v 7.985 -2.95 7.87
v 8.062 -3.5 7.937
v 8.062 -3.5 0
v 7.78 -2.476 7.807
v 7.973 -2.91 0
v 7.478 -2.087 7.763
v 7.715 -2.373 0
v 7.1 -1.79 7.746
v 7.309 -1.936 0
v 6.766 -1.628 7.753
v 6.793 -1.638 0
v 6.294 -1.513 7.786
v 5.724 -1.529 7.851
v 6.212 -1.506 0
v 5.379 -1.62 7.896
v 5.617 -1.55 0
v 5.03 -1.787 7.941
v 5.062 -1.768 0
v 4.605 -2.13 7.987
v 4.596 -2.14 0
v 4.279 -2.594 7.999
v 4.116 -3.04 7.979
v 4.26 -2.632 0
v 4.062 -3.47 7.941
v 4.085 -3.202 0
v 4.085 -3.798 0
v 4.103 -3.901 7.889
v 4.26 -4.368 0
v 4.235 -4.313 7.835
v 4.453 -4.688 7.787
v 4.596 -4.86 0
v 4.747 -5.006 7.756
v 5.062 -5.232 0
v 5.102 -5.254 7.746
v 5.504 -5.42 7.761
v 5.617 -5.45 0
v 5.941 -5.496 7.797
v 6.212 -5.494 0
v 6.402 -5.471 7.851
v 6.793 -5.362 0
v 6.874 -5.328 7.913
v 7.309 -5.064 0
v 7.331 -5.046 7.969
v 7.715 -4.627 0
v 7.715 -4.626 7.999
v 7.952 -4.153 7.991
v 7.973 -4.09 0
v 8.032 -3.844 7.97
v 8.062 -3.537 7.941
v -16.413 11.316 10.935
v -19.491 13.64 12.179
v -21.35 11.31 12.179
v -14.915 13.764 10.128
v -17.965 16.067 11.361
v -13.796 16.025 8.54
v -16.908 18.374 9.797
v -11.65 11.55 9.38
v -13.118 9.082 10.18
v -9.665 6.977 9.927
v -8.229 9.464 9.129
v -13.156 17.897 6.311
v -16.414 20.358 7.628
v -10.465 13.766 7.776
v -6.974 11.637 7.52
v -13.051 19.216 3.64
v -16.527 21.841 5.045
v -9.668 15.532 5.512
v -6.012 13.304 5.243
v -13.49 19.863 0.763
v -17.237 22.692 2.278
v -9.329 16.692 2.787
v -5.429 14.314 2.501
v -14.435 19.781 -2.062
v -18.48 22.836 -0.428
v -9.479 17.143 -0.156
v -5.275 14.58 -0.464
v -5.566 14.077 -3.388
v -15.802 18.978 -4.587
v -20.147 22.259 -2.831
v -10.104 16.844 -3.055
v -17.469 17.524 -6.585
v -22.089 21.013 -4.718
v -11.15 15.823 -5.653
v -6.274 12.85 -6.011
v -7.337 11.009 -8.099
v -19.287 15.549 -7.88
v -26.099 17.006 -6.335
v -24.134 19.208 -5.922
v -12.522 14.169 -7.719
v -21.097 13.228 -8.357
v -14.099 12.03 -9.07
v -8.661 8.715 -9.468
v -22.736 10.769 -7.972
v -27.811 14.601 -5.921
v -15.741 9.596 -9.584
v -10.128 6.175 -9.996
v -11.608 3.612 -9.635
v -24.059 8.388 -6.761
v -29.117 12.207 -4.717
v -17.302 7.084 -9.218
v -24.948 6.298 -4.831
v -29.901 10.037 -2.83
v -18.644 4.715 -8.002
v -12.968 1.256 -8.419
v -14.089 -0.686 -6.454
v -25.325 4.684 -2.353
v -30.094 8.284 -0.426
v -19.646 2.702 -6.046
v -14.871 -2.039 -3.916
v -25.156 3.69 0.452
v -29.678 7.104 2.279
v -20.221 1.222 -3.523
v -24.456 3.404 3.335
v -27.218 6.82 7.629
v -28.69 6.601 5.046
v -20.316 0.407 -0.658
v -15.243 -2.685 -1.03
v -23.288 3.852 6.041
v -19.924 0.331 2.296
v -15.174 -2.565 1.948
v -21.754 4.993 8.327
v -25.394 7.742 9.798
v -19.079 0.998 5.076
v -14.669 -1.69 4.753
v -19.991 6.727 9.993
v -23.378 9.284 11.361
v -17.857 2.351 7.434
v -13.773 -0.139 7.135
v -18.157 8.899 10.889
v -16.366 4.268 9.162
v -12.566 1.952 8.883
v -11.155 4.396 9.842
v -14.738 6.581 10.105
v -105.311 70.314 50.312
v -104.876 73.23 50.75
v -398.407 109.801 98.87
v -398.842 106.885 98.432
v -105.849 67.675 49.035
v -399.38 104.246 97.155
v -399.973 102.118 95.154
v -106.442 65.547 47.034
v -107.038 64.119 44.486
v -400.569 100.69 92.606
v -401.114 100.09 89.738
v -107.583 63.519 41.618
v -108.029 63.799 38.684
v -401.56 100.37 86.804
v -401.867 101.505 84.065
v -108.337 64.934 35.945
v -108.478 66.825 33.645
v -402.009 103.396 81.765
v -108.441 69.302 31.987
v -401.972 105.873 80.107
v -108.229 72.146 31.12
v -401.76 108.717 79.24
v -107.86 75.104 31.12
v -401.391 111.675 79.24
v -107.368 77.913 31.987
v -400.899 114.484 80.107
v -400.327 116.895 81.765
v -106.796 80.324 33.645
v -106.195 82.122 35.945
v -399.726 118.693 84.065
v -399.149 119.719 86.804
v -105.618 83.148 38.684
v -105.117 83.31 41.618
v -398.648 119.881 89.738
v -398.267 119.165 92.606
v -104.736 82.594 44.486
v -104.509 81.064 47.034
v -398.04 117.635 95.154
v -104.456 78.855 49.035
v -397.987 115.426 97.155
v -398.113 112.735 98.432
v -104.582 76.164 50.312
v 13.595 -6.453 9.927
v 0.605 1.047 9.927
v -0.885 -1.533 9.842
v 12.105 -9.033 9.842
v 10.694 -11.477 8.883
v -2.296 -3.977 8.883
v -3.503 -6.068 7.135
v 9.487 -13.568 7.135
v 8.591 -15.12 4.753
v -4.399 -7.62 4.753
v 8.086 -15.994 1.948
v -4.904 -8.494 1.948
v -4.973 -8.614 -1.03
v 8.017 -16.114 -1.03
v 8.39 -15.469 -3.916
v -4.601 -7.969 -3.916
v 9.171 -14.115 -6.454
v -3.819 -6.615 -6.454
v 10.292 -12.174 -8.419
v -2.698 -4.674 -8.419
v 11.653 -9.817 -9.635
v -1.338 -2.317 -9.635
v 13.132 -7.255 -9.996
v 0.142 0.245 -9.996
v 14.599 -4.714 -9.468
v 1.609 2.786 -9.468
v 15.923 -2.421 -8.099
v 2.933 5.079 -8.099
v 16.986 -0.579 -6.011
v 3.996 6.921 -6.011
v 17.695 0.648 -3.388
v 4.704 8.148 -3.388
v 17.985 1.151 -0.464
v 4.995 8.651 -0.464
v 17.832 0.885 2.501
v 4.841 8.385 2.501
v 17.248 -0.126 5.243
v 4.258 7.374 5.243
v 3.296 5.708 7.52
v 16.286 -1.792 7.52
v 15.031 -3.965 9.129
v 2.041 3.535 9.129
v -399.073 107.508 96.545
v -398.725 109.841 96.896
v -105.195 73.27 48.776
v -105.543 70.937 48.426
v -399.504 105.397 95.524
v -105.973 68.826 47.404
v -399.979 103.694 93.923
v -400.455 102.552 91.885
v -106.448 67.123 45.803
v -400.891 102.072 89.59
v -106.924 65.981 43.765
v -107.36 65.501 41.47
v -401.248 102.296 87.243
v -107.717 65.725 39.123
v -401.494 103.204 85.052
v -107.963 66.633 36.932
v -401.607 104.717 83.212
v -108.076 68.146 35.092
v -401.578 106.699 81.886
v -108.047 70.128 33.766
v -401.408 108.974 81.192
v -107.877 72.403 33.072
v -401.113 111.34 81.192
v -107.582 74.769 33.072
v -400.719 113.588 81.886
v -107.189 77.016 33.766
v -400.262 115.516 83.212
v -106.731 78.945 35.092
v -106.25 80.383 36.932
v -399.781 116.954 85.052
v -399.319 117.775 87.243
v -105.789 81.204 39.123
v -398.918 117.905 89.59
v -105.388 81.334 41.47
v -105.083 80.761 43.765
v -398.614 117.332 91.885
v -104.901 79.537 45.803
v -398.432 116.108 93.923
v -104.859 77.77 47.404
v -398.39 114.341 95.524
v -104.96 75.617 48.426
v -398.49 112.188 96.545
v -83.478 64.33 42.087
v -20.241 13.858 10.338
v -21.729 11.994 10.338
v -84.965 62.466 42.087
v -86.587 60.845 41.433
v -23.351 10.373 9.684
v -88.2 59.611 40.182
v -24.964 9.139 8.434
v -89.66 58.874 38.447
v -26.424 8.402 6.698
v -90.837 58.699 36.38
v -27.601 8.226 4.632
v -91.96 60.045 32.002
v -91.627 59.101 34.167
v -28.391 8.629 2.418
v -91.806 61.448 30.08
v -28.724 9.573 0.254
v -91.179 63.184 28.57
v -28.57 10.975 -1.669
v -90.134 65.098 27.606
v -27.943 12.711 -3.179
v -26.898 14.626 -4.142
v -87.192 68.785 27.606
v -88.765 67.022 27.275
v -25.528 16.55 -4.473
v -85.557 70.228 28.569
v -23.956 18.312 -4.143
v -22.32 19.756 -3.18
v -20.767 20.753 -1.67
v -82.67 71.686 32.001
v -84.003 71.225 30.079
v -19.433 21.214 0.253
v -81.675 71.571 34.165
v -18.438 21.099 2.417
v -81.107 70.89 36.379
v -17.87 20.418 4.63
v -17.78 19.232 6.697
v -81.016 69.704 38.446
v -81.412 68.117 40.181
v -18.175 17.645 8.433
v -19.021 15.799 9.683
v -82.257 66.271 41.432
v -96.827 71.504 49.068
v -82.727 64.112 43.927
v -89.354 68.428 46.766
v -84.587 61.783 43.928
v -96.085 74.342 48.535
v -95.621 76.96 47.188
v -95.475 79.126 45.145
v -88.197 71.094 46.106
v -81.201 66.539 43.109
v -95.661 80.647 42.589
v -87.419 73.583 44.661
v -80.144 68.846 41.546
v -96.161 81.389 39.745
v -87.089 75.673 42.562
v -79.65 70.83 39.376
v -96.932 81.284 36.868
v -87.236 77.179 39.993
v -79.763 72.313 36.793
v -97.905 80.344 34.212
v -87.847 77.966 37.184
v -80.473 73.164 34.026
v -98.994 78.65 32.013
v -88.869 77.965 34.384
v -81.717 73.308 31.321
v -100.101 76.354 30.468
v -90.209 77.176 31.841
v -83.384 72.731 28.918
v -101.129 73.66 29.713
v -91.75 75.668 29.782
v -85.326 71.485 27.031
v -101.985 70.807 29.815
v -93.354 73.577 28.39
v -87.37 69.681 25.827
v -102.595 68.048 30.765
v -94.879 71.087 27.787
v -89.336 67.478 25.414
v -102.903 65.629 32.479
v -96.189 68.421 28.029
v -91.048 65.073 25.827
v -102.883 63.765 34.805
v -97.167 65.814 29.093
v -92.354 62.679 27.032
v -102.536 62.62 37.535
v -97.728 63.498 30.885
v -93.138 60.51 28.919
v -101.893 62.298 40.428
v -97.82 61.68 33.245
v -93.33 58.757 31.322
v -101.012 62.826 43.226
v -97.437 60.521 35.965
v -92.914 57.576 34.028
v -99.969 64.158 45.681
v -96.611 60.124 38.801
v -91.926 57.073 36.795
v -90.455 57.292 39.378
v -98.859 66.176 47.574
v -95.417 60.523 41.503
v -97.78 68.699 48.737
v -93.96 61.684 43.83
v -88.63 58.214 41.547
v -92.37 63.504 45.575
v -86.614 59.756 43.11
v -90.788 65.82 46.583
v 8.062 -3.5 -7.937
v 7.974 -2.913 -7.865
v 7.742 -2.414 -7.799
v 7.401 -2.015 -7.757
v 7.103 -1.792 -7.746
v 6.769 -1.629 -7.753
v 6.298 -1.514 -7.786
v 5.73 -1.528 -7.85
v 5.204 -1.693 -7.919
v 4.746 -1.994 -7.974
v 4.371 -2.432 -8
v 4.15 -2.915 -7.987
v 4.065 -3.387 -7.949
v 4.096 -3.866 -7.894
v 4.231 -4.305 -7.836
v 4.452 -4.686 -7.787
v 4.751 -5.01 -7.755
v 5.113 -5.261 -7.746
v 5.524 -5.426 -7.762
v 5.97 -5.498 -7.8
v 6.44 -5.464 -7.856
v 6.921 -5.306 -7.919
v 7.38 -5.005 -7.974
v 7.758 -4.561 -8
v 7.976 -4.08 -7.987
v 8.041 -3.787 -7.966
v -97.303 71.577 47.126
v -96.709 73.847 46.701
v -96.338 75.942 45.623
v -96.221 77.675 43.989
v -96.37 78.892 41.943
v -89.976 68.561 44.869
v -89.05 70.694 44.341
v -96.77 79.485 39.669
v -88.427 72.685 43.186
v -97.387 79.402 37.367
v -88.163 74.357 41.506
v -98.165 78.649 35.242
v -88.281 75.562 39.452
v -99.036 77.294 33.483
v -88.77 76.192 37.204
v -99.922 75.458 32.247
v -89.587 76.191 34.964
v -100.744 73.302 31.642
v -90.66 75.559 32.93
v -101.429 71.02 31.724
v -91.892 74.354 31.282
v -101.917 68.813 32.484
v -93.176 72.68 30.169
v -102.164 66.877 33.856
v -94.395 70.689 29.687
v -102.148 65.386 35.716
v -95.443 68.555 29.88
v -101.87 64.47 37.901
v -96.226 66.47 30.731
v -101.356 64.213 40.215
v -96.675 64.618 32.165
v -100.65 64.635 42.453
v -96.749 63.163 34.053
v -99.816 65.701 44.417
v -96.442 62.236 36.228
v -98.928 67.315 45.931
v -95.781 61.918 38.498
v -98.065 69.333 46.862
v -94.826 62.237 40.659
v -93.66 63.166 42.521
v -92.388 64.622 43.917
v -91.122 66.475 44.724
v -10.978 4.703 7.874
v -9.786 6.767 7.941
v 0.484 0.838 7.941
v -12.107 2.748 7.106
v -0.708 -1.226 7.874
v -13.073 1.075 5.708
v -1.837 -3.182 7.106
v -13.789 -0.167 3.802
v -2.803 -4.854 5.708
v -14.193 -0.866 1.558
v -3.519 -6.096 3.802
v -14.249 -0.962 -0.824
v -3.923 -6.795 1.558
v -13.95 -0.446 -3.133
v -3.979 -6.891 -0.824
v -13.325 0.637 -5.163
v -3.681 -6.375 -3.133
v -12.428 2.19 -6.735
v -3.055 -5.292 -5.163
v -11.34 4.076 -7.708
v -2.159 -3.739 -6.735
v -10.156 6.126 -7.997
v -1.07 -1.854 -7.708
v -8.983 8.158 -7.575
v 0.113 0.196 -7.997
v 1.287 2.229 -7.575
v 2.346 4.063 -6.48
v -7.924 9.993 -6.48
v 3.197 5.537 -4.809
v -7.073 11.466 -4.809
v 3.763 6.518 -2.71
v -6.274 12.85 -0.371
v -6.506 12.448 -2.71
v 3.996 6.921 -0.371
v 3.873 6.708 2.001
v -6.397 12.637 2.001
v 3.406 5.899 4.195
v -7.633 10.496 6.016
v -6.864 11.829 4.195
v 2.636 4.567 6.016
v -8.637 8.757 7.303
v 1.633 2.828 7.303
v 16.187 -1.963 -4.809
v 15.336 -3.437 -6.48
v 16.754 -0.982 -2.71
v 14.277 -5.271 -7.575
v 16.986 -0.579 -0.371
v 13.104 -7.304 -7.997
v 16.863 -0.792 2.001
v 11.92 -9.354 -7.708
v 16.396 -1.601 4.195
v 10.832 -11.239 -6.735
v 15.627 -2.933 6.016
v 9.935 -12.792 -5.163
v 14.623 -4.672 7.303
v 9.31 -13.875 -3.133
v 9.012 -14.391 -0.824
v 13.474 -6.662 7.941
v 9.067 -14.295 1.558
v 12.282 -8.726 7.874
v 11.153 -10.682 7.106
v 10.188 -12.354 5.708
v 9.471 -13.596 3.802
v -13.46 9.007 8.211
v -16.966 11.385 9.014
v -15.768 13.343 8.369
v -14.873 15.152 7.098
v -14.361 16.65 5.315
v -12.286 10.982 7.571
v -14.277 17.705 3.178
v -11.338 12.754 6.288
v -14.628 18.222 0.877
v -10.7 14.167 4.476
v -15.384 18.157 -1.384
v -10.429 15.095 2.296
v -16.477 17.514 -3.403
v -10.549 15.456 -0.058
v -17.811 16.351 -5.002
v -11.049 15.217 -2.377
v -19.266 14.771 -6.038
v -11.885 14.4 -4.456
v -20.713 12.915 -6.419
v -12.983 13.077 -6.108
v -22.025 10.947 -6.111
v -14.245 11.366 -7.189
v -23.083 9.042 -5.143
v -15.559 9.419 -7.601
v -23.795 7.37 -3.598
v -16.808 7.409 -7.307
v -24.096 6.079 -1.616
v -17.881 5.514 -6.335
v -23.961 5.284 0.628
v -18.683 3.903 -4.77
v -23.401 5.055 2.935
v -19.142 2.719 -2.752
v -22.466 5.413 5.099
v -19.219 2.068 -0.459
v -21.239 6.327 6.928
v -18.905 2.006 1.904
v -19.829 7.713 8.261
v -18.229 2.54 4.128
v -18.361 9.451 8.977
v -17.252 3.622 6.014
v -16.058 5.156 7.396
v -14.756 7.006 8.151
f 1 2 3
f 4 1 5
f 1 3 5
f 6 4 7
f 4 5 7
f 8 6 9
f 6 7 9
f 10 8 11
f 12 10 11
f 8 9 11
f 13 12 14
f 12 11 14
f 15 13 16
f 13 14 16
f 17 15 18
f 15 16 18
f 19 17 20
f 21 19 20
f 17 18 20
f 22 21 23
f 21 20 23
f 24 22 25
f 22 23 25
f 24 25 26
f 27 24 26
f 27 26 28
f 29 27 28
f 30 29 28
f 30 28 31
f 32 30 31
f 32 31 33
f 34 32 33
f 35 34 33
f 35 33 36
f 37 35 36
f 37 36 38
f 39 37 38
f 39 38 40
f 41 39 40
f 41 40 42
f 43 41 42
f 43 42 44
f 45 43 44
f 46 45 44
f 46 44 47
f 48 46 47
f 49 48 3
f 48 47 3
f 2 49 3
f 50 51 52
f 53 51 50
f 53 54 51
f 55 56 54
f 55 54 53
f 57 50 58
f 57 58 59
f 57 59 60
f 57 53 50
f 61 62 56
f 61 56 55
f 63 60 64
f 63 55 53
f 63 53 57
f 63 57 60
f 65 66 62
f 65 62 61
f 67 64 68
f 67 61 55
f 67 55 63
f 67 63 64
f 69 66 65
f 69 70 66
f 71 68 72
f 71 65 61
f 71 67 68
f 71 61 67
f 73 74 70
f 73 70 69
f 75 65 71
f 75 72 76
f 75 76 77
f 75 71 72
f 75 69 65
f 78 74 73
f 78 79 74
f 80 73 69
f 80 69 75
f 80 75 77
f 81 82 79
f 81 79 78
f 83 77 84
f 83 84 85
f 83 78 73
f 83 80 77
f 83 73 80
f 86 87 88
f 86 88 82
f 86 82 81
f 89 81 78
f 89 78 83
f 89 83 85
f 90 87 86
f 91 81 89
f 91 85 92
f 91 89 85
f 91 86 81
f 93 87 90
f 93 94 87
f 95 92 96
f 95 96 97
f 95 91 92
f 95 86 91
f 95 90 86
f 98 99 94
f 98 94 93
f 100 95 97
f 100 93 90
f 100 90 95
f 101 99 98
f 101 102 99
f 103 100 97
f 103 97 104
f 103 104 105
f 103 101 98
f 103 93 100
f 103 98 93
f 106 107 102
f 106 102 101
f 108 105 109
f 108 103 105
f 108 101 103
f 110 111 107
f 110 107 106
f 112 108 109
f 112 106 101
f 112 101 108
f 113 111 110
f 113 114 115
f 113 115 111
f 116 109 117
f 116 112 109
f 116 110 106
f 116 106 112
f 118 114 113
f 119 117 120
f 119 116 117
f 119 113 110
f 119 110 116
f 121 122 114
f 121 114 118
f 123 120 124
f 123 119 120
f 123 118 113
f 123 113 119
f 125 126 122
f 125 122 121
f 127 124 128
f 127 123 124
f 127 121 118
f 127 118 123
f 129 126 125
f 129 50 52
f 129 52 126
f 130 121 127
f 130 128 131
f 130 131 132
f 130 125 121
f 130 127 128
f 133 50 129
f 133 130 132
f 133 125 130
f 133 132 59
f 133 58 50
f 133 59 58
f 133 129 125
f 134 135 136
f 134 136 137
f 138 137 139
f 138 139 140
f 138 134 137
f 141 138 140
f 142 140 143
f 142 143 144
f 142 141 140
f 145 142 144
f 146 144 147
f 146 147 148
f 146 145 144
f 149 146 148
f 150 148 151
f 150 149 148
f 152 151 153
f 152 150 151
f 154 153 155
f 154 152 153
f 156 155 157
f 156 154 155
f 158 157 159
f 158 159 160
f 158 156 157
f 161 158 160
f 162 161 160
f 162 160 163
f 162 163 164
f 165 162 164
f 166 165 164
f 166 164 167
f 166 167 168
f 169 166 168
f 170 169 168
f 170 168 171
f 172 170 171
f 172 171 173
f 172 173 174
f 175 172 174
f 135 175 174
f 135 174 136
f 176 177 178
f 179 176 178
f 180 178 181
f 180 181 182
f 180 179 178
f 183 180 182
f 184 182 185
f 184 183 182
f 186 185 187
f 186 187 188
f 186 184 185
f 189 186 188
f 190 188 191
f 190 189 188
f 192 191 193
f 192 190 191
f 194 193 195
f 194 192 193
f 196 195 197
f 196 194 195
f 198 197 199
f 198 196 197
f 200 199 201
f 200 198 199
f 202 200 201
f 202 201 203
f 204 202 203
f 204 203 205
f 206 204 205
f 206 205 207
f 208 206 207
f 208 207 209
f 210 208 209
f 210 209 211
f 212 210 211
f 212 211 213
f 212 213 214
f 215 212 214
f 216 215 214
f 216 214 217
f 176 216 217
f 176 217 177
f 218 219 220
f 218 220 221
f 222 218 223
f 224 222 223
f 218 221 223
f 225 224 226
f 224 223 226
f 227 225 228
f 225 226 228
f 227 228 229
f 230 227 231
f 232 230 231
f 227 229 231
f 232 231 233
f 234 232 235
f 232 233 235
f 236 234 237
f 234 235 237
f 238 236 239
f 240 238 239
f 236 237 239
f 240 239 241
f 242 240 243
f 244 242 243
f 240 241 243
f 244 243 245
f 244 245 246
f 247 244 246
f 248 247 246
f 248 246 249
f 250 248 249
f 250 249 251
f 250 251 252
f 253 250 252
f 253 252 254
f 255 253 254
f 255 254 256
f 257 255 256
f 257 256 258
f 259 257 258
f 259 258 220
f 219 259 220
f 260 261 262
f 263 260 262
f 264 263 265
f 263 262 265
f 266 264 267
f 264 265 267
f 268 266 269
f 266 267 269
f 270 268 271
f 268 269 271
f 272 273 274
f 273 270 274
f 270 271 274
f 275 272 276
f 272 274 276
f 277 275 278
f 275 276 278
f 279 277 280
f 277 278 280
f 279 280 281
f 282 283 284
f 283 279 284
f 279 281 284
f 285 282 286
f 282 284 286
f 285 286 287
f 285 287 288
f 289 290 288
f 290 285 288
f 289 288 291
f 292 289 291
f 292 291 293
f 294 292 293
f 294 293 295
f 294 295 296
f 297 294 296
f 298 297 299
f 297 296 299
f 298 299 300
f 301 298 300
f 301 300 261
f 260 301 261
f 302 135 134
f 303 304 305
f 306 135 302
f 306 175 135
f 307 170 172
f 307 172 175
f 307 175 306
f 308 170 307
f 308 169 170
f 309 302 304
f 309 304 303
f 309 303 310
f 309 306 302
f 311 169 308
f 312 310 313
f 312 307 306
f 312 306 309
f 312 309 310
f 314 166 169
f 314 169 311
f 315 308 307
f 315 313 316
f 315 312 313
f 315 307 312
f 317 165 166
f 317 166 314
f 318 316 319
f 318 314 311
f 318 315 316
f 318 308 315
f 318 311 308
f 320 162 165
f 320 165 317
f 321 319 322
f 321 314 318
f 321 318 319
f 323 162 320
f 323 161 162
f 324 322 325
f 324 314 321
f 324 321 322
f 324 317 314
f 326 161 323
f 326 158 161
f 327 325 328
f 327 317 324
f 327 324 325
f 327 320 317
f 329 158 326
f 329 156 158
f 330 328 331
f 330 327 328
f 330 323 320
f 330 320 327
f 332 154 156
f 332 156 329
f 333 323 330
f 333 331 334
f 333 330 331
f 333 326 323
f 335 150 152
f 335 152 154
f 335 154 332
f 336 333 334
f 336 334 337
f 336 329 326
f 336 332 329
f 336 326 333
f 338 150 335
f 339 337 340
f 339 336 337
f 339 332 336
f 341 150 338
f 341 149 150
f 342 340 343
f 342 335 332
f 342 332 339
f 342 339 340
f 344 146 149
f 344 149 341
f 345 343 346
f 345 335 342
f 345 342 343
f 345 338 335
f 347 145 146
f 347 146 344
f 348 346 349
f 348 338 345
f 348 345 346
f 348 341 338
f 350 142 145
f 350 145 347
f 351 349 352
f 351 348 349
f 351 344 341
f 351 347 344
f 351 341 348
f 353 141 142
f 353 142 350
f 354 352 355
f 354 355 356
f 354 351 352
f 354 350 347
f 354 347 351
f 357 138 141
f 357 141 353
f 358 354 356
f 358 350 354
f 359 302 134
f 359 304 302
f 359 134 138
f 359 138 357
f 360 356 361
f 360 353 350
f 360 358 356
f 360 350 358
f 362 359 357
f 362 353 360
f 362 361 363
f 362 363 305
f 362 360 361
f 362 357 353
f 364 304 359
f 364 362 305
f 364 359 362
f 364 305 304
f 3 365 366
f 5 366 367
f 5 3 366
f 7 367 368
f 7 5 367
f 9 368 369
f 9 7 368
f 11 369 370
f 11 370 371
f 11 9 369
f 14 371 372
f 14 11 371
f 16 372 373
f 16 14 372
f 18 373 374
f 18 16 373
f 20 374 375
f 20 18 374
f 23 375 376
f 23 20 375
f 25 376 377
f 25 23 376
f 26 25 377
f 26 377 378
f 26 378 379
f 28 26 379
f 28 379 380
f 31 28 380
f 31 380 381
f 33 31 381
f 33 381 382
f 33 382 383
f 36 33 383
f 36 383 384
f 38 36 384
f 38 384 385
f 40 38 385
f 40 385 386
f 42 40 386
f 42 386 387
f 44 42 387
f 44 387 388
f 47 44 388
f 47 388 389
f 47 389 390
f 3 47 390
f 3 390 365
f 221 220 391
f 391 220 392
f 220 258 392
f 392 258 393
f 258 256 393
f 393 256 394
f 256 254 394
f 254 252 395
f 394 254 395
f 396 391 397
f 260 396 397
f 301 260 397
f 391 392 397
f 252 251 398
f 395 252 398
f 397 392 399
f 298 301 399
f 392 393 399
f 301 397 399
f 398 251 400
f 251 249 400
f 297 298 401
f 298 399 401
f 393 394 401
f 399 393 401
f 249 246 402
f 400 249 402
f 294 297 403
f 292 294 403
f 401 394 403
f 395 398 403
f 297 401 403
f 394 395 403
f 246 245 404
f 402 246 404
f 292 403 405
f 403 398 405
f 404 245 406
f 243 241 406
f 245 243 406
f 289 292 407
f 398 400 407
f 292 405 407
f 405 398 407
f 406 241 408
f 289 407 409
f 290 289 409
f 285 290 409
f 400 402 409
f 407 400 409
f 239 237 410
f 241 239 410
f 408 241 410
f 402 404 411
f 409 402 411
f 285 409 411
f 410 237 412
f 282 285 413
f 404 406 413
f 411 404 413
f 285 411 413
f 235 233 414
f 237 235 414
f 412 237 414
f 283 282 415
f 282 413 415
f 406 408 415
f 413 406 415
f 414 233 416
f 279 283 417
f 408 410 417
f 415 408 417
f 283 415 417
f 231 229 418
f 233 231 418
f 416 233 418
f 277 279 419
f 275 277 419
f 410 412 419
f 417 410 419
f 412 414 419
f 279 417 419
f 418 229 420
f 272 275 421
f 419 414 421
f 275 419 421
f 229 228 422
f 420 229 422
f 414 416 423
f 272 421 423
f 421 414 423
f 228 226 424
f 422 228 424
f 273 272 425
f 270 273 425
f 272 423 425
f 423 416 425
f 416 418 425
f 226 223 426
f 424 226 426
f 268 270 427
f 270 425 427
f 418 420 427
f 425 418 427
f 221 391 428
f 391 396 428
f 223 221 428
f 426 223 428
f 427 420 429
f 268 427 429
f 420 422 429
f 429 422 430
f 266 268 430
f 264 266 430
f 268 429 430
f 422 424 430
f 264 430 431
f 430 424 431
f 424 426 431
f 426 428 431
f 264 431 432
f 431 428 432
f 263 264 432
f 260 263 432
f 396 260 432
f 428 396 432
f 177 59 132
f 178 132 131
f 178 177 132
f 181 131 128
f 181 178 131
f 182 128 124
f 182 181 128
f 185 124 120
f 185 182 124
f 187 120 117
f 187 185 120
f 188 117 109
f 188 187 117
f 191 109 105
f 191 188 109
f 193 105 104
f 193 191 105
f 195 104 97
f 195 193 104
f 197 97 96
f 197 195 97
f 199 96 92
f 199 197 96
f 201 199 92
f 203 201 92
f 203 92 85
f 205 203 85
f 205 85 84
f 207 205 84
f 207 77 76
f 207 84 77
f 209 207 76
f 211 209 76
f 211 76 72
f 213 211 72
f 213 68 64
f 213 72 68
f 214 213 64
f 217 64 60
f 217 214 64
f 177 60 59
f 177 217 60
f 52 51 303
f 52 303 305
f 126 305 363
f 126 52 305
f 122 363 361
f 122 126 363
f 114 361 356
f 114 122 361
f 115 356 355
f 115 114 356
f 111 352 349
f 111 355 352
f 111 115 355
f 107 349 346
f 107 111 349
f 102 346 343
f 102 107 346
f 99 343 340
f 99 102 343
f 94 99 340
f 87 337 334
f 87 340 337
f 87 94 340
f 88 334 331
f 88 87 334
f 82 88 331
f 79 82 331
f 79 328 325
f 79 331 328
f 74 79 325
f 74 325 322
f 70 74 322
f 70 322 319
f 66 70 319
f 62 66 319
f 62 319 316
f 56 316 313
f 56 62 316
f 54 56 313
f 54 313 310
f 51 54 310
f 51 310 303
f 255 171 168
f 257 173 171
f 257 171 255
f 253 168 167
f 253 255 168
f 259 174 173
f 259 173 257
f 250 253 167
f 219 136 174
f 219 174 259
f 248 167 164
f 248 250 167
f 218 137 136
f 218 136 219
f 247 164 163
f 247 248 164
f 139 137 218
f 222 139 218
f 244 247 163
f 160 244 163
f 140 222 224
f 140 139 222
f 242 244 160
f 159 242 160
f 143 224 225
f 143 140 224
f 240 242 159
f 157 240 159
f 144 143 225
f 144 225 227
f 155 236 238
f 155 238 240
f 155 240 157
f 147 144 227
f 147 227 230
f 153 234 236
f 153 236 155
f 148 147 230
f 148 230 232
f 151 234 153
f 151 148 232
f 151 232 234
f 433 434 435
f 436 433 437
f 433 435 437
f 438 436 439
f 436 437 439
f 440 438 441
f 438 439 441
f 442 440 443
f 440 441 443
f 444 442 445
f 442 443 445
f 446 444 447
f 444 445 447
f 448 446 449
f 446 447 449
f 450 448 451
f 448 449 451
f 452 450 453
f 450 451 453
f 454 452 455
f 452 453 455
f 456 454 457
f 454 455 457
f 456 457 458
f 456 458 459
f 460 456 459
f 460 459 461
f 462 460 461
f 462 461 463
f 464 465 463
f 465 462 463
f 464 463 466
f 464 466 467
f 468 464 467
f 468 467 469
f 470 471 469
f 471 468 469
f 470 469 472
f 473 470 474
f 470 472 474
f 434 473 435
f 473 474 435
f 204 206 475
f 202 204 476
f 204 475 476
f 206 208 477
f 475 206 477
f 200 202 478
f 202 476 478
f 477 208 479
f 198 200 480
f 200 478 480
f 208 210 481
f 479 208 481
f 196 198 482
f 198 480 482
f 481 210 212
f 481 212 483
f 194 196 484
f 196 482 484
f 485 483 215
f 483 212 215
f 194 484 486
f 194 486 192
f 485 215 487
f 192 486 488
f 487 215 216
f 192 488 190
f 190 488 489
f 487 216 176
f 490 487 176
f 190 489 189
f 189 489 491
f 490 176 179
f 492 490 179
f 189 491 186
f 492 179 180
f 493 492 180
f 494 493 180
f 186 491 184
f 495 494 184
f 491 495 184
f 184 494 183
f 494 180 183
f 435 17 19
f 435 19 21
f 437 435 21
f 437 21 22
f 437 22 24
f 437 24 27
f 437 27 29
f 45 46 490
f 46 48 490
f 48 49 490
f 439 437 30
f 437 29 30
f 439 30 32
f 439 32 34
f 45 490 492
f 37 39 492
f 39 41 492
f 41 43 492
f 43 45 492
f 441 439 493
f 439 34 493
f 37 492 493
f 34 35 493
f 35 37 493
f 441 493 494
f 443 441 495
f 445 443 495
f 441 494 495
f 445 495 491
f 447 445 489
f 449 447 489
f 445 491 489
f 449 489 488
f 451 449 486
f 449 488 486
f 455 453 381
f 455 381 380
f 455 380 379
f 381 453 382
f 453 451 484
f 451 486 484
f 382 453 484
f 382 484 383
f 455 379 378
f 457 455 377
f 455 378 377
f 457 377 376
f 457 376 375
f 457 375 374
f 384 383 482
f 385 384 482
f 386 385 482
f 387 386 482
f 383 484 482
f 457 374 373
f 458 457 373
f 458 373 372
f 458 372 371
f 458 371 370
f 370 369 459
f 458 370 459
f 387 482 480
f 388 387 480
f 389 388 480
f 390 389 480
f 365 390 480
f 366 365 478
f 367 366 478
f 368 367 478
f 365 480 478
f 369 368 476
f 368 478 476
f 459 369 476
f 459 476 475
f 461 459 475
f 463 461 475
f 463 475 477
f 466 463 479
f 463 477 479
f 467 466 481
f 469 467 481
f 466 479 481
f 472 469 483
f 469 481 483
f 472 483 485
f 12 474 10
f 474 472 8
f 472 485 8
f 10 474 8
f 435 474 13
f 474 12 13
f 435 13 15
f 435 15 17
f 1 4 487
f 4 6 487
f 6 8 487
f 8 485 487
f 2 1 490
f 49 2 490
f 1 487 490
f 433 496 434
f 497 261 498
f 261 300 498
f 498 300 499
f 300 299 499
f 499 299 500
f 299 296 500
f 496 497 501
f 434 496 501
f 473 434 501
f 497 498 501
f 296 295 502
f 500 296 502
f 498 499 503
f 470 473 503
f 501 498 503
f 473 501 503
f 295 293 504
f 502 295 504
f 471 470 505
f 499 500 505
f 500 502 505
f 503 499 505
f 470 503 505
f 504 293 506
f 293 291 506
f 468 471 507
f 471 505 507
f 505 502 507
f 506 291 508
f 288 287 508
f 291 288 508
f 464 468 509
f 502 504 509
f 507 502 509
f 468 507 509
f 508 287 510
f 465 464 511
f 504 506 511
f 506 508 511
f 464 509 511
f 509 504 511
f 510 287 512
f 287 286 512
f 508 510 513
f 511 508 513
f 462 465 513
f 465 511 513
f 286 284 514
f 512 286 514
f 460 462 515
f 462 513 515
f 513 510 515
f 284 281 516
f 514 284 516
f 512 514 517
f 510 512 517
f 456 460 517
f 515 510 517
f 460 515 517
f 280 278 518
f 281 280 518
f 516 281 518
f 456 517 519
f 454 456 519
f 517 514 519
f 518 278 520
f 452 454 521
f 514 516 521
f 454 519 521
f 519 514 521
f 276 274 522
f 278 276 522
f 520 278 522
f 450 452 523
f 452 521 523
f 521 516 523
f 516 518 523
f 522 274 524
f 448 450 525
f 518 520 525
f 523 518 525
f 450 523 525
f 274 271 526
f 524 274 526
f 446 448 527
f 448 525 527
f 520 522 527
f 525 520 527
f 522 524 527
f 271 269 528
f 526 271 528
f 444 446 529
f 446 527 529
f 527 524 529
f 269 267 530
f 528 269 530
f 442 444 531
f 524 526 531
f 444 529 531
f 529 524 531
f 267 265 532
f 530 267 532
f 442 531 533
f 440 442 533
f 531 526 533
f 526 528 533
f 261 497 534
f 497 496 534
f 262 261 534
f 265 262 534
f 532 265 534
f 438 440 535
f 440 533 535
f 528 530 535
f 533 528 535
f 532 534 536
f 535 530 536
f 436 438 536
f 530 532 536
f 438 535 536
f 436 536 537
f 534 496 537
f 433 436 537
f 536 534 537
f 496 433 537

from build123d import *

# Parameters (mm, degrees)
ESQUISSE1_R                       = 10
ESQUISSE1_R_2                     = 8
EXTRUSION1_REACH                  = 433.016
EXTRUSION1_END_RADIUS             = 8
ESQUISSE3_R                       = 2
EXTRUSION1_DIRECTION_2_REACH      = 433.016
EXTRUSION1_DIRECTION_2_END_RADIUS = 8


with BuildPart() as part:
    # Balayage1: sweep along a curve in space
    with BuildLine() as balayage1_path:
        Line((0, 0, 0), (12.990381057, -7.5, 0))
        Line((0, 0, 0), (-10.26979763, 5.929270426, 0))
        ThreePointArc((-23.243938294, 14.727794485, 2.973935241), (-17.035828208, 10.165933144, 0.751028422), (-10.26979763, 5.929270426, 0))
        Line((-23.243938294, 14.727794485, 2.973935241), (-86.480363257, 65.200039483, 34.722605481))
        ThreePointArc((-106.469208033, 73.428950509, 40.880198038), (-95.752548684, 70.629649492, 38.3883833), (-86.480363257, 65.200039483, 34.722605481))
        Line((-106.469208033, 73.428950509, 40.880198038), (-400, 110, 89))
    # Esquisse1 → Balayage1 (sweep)
    with BuildSketch(Plane(origin=(-400, 110, 89), x_dir=(0.15933409799773637, -0.019851461389881916, 0.9870251084425026), z_dir=(-0.9794525040369775, 0.12203014804395138, 0.1605659842683569))):
        Circle(ESQUISSE1_R)
        Circle(ESQUISSE1_R_2, mode=Mode.SUBTRACT)
    sweep(path=balayage1_path.line)

    # Extrusion1: up to this cylinder (the profile starts inside it)
    extrusion1_end = Plane(origin=(6.062177957, -3.500000075, 0), z_dir=(0.866025403784438, -0.500000000000001, 0)) * Cylinder(EXTRUSION1_END_RADIUS, 883.032, mode=Mode.PRIVATE)
    # Esquisse3 → Extrusion1 (add, up to the surface)
    with BuildSketch(Plane.XY, mode=Mode.PRIVATE) as extrusion1_sk1:
        with Locations((6.062177826, -3.5)):
            Circle(ESQUISSE3_R)
    extrusion1_tool1 = extrude(extrusion1_sk1.sketch, amount=EXTRUSION1_REACH, mode=Mode.PRIVATE) & extrusion1_end
    add(extrusion1_tool1.solids().sort_by_distance((6.062178, -3.5, 0))[0])

    # Extrusion1 direction 2: up to this cylinder (the profile starts inside it)
    extrusion1_direction_2_end = Plane(origin=(6.062177957, -3.500000075, 0), z_dir=(0.866025403784438, -0.500000000000001, 0)) * Cylinder(EXTRUSION1_DIRECTION_2_END_RADIUS, 883.032, mode=Mode.PRIVATE)
    # Esquisse3 → Extrusion1 direction 2 (add, up to the surface)
    with BuildSketch(Plane.XY, mode=Mode.PRIVATE) as extrusion1_direction_2_sk1:
        with Locations((6.062177826, -3.5)):
            Circle(ESQUISSE3_R)
    extrusion1_direction_2_tool1 = extrude(extrusion1_direction_2_sk1.sketch, amount=-EXTRUSION1_DIRECTION_2_REACH, mode=Mode.PRIVATE) & extrusion1_direction_2_end
    add(extrusion1_direction_2_tool1.solids().sort_by_distance((6.062178, -3.5, 0))[0])


solid = part.part
